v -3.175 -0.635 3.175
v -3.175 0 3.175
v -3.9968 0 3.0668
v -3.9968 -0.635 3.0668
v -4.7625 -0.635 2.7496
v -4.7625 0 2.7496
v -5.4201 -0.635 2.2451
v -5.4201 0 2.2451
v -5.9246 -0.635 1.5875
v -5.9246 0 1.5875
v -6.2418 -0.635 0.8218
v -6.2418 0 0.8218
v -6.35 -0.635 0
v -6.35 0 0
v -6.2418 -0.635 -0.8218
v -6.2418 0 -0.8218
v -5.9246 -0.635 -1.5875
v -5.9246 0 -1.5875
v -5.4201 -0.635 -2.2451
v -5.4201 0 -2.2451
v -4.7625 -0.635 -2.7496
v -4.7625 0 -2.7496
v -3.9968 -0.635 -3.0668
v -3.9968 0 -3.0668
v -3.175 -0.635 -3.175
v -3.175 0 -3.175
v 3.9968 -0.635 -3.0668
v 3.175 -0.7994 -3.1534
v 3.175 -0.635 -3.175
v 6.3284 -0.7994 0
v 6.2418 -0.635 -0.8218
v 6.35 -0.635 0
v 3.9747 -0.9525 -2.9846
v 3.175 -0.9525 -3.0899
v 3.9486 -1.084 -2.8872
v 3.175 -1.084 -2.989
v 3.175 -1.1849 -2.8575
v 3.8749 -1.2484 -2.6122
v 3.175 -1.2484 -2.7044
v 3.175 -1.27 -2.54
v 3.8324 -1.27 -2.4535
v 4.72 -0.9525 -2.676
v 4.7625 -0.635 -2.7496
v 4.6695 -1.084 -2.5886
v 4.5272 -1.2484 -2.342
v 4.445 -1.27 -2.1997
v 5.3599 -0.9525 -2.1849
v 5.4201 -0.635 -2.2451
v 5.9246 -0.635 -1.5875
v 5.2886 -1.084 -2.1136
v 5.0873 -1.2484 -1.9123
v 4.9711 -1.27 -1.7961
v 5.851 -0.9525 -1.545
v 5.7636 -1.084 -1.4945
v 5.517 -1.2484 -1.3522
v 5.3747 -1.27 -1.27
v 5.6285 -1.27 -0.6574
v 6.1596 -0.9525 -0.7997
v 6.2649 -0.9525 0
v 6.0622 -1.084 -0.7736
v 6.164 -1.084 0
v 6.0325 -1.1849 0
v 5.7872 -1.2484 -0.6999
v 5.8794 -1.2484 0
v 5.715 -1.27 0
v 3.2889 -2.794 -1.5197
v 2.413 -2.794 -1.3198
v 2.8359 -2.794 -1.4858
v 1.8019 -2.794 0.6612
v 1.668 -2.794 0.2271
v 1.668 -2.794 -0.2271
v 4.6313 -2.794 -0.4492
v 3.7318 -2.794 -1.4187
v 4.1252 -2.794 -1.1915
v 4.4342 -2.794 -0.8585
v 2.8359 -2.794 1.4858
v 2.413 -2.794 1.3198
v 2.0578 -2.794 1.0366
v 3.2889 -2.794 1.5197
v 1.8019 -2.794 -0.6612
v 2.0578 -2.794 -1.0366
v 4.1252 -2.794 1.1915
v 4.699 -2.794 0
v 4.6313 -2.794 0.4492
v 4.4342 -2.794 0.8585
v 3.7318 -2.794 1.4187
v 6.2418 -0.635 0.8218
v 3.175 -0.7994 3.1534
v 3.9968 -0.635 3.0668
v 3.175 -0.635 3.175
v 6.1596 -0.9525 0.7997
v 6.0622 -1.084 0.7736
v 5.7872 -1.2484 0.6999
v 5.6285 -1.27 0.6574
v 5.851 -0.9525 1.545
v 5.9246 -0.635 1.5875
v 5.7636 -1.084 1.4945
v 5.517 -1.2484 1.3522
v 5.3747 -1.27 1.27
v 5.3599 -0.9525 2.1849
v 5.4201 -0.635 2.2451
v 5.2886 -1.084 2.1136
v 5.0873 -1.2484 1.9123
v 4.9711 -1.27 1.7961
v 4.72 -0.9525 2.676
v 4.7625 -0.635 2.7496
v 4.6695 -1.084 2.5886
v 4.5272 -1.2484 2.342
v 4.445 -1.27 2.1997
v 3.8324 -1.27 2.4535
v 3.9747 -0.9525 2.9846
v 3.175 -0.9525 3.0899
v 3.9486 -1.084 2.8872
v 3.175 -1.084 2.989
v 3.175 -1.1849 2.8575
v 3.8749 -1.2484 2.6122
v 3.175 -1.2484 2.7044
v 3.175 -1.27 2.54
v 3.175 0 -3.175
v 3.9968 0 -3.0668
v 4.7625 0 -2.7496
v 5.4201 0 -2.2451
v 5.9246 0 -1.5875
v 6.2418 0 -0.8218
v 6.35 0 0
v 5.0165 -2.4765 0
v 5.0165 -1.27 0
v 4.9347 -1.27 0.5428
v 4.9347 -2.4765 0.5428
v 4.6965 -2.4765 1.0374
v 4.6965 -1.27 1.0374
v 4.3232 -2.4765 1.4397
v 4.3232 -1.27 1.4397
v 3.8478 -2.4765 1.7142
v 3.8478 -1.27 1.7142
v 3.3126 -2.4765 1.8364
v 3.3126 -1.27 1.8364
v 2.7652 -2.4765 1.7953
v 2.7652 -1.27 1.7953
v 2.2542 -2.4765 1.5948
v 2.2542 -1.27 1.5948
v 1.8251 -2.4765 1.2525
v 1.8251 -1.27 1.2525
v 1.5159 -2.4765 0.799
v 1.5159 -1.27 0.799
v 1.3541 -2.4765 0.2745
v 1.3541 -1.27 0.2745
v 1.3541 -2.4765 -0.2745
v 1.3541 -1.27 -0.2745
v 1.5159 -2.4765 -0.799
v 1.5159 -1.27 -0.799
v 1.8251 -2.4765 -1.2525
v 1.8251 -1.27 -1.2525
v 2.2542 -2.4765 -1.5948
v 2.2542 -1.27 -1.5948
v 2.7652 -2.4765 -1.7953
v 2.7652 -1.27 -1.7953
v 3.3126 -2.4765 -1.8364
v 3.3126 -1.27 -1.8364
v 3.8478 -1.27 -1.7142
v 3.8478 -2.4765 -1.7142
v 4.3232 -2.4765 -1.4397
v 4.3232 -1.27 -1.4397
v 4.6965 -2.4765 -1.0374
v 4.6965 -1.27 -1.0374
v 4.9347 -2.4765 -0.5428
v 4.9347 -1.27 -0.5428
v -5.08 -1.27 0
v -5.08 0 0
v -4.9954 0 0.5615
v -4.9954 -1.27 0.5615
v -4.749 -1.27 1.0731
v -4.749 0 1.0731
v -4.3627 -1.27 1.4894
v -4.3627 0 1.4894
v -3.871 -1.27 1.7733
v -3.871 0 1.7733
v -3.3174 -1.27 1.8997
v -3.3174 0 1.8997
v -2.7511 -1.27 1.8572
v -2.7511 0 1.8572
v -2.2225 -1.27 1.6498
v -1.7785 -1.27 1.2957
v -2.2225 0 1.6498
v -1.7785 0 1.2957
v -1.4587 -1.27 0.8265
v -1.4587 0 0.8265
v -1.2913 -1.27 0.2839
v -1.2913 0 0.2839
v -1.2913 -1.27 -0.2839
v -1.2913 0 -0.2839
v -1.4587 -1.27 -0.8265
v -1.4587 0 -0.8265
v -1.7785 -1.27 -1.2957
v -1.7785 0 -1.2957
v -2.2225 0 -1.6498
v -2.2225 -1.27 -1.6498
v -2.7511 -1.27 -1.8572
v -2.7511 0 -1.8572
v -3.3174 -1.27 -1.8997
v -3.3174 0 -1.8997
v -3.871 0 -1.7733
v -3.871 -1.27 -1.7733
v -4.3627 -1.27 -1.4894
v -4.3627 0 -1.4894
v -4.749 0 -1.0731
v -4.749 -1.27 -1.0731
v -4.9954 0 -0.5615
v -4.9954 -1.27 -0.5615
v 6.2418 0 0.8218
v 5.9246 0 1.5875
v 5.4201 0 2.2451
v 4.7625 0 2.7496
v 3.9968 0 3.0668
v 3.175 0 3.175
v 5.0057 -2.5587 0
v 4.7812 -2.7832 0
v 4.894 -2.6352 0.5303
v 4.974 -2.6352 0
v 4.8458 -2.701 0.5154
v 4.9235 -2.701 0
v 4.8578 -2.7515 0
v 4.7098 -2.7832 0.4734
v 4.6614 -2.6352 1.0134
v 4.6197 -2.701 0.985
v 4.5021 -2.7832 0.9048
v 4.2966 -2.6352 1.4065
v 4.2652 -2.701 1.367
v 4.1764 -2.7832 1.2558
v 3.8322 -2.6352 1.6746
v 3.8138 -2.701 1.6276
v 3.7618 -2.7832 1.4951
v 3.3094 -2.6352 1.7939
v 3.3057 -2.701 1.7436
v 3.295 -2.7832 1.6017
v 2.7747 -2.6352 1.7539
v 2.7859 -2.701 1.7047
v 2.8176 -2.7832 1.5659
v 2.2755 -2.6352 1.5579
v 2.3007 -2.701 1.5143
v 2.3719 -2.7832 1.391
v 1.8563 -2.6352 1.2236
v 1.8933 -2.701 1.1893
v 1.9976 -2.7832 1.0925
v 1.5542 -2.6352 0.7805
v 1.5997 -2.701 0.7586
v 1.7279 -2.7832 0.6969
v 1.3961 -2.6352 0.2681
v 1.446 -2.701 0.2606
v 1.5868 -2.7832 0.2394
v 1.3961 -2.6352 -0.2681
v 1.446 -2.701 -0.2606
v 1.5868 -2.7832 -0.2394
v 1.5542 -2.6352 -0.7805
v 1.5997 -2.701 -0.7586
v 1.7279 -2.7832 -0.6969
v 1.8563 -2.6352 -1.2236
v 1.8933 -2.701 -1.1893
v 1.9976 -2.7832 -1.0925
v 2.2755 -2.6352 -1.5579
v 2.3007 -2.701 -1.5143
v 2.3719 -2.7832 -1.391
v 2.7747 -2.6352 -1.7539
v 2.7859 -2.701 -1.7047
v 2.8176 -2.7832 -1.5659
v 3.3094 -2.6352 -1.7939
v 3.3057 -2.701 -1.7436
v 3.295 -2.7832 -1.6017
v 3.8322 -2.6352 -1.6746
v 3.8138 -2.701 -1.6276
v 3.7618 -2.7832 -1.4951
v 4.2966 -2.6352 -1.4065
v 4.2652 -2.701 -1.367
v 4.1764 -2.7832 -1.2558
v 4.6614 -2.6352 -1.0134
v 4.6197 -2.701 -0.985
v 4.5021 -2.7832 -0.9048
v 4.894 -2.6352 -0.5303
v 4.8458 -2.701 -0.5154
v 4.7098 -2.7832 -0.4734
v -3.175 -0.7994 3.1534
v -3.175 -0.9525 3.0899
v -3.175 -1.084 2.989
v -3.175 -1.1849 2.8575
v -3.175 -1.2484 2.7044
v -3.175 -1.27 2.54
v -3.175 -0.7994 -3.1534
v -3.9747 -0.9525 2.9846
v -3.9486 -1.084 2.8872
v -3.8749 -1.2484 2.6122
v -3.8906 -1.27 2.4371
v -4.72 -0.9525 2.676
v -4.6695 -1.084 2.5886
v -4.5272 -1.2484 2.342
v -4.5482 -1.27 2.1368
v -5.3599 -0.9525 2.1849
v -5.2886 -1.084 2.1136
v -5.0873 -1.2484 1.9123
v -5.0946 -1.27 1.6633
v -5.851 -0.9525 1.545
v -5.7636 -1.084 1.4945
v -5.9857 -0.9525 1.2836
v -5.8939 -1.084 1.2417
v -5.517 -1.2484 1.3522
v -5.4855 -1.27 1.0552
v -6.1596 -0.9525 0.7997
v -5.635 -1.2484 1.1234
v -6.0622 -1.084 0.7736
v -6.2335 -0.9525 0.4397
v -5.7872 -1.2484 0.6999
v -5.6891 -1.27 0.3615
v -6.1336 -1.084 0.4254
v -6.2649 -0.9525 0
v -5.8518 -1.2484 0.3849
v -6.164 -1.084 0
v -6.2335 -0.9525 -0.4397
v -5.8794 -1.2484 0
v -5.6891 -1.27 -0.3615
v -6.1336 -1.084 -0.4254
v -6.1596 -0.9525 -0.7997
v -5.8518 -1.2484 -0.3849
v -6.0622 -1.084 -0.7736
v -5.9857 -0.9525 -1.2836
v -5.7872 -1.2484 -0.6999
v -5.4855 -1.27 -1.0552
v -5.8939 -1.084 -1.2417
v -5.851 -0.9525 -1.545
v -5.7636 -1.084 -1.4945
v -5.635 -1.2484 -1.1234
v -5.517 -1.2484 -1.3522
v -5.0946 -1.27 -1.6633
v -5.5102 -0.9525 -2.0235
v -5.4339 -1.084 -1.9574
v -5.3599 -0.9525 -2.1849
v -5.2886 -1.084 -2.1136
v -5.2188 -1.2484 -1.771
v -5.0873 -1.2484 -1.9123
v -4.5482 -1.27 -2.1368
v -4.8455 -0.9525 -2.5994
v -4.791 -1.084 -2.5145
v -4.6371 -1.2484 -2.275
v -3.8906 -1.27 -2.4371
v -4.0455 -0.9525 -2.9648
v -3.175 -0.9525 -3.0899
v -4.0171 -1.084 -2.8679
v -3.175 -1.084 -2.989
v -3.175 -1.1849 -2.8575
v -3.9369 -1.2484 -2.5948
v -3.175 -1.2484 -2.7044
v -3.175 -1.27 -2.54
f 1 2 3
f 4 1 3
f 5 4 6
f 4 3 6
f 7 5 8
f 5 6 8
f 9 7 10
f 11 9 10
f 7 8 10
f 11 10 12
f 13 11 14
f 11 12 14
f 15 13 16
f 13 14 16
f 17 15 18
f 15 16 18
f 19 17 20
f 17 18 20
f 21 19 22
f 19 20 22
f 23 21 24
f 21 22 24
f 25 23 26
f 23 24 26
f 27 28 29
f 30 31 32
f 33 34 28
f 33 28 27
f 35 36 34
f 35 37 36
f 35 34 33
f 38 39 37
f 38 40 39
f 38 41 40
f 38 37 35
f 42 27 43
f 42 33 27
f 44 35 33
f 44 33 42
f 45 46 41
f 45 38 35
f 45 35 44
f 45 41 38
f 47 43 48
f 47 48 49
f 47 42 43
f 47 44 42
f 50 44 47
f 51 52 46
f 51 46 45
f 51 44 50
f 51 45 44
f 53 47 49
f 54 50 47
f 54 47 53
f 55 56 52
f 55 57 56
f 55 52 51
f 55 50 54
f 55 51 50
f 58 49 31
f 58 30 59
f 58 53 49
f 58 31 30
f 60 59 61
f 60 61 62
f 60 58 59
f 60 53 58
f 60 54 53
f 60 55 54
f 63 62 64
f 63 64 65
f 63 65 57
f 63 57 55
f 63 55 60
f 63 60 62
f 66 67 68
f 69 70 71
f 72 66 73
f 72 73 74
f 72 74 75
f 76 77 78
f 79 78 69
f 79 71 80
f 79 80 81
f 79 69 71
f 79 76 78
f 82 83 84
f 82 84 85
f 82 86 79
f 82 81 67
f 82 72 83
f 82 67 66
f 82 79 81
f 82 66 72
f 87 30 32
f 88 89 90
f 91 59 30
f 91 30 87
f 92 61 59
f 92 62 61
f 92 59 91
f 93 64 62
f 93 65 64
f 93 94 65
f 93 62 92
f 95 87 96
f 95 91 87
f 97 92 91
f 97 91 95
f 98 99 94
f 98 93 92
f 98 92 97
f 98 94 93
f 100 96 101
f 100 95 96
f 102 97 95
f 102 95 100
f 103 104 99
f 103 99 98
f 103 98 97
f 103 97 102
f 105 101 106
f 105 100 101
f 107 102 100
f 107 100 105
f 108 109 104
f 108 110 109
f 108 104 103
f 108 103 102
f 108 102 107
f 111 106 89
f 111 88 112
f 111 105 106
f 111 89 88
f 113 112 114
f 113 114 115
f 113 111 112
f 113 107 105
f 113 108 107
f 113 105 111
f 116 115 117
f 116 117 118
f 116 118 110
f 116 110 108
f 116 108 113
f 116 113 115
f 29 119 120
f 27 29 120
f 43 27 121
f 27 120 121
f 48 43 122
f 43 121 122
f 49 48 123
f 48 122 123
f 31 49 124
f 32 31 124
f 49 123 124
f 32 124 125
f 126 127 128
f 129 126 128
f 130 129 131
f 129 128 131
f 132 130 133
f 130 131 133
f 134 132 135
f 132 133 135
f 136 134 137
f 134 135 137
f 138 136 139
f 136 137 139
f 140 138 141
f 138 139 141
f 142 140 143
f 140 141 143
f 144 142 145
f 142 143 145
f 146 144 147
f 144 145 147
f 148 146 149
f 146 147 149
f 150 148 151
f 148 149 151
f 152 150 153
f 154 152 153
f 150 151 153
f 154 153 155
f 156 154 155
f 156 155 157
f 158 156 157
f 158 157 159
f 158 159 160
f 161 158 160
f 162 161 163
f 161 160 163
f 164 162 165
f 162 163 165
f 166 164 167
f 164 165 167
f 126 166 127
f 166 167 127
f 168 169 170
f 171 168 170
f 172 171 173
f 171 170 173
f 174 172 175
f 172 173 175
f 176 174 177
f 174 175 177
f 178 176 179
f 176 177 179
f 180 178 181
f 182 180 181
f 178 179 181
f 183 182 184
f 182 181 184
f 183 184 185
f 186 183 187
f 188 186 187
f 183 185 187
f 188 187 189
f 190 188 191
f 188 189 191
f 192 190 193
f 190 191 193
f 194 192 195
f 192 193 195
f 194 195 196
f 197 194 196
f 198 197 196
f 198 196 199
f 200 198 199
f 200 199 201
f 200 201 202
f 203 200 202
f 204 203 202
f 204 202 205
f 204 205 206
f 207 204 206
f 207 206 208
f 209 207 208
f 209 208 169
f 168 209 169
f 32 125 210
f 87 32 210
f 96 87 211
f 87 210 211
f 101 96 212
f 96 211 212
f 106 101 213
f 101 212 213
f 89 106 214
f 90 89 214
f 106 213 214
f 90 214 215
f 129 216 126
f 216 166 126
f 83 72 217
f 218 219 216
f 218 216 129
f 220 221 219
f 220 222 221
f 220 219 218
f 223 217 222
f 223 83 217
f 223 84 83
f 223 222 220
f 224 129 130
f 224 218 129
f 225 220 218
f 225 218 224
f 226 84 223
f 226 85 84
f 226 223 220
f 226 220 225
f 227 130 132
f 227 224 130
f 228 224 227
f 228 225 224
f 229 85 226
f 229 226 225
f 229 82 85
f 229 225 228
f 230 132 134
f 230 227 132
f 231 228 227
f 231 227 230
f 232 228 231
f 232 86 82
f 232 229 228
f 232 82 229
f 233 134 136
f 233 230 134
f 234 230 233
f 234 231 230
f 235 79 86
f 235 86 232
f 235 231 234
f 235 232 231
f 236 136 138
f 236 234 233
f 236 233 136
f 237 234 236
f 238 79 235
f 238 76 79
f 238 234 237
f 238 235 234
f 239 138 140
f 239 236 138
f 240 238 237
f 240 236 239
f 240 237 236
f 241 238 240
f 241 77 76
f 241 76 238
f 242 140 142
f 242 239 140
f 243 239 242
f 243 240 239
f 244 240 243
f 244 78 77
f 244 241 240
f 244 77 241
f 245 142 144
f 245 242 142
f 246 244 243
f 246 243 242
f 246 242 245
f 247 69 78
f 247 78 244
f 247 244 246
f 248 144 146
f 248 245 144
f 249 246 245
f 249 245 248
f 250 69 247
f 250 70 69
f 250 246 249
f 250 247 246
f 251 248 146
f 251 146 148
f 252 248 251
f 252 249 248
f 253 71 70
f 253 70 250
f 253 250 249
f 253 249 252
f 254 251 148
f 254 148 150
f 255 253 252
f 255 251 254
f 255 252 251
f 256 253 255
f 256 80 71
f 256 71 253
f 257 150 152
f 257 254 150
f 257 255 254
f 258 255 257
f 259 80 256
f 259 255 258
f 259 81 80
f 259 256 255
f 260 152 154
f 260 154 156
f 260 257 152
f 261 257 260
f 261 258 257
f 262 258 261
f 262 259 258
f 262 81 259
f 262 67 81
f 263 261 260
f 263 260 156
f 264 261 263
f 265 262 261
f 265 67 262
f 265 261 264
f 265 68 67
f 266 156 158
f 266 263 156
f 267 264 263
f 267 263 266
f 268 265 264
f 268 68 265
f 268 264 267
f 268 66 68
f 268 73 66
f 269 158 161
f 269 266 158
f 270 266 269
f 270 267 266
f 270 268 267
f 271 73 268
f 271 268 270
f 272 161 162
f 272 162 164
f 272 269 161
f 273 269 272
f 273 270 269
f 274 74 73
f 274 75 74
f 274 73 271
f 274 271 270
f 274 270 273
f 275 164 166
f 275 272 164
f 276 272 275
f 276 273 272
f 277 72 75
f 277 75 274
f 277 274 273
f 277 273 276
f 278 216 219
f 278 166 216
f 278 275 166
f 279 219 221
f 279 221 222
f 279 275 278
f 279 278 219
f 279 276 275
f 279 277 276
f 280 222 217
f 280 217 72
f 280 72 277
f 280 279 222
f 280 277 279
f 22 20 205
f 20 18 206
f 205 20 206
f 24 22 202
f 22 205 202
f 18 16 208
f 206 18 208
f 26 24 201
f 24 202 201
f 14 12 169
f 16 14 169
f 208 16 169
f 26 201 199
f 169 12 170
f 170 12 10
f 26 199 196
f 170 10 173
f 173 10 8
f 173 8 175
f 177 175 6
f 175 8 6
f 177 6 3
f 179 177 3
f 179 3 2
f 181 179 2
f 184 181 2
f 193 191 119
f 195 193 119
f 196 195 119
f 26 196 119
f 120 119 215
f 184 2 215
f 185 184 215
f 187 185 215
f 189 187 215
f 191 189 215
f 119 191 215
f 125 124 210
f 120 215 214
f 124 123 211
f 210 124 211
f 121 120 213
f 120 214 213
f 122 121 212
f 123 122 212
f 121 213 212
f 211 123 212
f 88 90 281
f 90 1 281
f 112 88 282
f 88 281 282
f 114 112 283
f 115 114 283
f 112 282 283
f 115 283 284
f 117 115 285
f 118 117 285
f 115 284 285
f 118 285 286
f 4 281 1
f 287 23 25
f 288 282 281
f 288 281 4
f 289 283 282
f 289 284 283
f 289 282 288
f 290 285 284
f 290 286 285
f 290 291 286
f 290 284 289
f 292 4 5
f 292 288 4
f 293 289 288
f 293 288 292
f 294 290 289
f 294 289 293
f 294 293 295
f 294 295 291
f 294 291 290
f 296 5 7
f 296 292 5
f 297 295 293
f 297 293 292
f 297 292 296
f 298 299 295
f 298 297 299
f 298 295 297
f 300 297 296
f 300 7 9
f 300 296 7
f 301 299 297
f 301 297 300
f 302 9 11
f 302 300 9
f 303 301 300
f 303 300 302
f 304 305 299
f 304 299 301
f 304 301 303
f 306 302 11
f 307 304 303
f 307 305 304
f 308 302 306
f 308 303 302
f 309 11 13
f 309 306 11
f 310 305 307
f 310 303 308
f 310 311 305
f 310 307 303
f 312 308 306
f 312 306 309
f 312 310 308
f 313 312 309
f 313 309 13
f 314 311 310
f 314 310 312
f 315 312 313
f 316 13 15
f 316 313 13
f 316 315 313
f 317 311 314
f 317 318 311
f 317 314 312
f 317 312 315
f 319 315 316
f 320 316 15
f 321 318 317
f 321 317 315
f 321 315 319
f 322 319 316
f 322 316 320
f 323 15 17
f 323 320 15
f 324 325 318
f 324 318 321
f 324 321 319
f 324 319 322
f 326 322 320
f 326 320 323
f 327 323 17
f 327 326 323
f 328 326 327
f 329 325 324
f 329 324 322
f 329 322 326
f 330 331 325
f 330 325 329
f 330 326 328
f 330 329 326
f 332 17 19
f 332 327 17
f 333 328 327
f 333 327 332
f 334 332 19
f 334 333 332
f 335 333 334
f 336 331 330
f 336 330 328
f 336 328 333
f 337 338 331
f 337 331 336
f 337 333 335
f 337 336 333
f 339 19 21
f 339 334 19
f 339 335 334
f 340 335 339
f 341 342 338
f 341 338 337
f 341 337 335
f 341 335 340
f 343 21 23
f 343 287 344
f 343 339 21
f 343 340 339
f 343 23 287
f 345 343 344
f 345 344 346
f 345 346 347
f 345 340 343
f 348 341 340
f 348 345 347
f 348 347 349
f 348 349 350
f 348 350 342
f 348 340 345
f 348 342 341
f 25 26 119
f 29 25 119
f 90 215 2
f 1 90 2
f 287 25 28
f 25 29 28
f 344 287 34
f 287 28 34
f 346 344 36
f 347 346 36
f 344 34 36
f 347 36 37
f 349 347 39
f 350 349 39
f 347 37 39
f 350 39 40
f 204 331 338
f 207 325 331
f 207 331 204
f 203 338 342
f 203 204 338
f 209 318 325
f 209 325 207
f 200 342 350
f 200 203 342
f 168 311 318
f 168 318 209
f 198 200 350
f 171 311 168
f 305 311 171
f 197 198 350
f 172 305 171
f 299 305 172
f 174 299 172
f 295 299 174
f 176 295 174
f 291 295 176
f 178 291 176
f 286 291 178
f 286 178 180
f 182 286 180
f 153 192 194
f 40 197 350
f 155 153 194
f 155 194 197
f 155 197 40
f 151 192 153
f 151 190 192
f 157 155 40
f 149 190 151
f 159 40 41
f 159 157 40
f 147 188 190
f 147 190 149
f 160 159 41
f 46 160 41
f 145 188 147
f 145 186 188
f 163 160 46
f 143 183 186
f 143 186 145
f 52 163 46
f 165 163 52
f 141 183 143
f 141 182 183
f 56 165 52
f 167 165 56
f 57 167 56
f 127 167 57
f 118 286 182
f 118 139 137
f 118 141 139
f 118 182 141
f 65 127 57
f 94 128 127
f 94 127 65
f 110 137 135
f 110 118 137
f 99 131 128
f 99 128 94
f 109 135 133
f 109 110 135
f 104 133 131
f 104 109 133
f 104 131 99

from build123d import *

# Parameters (mm, degrees)
F1_DEPTH = 1.27
F2_R     = 0.635
F4_R     = 1.8415
F5_DEPTH = 1.524
F7_D     = 3.81
F8_R     = 0.3175


with BuildPart() as f1:
    # F0 (on Front) → F1 (new body)
    with BuildSketch(Plane.XZ):
        with BuildLine():
            ThreePointArc((3.175, 3.175), (0.929936, 2.245064), (0, 0))
            ThreePointArc((0, 0), (0.929936, -2.245064), (3.175, -3.175))
            ThreePointArc((3.175, -3.175), (5.420064, -2.245064), (6.35, 0))
            ThreePointArc((6.35, 0), (5.420064, 2.245064), (3.175, 3.175))
        make_face()
        with BuildLine():
            ThreePointArc((3.175, -3.175), (0.929936, -2.245064), (0, 0))
            ThreePointArc((0, 0), (-0.929936, -2.245064), (-3.175, -3.175))
            Line((-3.175, -3.175), (3.175, -3.175))
        make_face()
        with BuildLine():
            ThreePointArc((-3.175, -3.175), (-0.929936, -2.245064), (0, 0))
            ThreePointArc((0, 0), (-0.929936, 2.245064), (-3.175, 3.175))
            ThreePointArc((-3.175, 3.175), (-6.35, 0), (-3.175, -3.175))
        make_face()
        with BuildLine():
            ThreePointArc((-3.175, 3.175), (-0.929936, 2.245064), (0, 0))
            ThreePointArc((0, 0), (0.929936, 2.245064), (3.175, 3.175))
            Line((3.175, 3.175), (-3.175, 3.175))
        make_face()
    extrude(amount=F1_DEPTH)

    # F2
    f2_edges = [f1.edges().sort_by_distance(p)[0] for p in [
        (0, -1.27, 3.175),
        (-6.35, -1.27, 0),
        (6.35, -1.27, 0),
        (0, -1.27, -3.175),
    ]]
    fillet(f2_edges, radius=F2_R)

    # F4 (on face) → F5 (join)
    with BuildSketch(Plane.XZ.offset(1.27)):
        with Locations((3.175, 0)):
            Circle(F4_R)
    extrude(amount=F5_DEPTH)

    # F7 (through all)
    with Locations(Plane.XZ.offset(1.27)):
        with Locations((-3.175, 0)):
            Hole(F7_D / 2)

    # F8
    f8_edges = [f1.edges().sort_by_distance(p)[0] for p in [
        (1.3335, -2.794, 0),
    ]]
    fillet(f8_edges, radius=F8_R)


solid = f1.part
